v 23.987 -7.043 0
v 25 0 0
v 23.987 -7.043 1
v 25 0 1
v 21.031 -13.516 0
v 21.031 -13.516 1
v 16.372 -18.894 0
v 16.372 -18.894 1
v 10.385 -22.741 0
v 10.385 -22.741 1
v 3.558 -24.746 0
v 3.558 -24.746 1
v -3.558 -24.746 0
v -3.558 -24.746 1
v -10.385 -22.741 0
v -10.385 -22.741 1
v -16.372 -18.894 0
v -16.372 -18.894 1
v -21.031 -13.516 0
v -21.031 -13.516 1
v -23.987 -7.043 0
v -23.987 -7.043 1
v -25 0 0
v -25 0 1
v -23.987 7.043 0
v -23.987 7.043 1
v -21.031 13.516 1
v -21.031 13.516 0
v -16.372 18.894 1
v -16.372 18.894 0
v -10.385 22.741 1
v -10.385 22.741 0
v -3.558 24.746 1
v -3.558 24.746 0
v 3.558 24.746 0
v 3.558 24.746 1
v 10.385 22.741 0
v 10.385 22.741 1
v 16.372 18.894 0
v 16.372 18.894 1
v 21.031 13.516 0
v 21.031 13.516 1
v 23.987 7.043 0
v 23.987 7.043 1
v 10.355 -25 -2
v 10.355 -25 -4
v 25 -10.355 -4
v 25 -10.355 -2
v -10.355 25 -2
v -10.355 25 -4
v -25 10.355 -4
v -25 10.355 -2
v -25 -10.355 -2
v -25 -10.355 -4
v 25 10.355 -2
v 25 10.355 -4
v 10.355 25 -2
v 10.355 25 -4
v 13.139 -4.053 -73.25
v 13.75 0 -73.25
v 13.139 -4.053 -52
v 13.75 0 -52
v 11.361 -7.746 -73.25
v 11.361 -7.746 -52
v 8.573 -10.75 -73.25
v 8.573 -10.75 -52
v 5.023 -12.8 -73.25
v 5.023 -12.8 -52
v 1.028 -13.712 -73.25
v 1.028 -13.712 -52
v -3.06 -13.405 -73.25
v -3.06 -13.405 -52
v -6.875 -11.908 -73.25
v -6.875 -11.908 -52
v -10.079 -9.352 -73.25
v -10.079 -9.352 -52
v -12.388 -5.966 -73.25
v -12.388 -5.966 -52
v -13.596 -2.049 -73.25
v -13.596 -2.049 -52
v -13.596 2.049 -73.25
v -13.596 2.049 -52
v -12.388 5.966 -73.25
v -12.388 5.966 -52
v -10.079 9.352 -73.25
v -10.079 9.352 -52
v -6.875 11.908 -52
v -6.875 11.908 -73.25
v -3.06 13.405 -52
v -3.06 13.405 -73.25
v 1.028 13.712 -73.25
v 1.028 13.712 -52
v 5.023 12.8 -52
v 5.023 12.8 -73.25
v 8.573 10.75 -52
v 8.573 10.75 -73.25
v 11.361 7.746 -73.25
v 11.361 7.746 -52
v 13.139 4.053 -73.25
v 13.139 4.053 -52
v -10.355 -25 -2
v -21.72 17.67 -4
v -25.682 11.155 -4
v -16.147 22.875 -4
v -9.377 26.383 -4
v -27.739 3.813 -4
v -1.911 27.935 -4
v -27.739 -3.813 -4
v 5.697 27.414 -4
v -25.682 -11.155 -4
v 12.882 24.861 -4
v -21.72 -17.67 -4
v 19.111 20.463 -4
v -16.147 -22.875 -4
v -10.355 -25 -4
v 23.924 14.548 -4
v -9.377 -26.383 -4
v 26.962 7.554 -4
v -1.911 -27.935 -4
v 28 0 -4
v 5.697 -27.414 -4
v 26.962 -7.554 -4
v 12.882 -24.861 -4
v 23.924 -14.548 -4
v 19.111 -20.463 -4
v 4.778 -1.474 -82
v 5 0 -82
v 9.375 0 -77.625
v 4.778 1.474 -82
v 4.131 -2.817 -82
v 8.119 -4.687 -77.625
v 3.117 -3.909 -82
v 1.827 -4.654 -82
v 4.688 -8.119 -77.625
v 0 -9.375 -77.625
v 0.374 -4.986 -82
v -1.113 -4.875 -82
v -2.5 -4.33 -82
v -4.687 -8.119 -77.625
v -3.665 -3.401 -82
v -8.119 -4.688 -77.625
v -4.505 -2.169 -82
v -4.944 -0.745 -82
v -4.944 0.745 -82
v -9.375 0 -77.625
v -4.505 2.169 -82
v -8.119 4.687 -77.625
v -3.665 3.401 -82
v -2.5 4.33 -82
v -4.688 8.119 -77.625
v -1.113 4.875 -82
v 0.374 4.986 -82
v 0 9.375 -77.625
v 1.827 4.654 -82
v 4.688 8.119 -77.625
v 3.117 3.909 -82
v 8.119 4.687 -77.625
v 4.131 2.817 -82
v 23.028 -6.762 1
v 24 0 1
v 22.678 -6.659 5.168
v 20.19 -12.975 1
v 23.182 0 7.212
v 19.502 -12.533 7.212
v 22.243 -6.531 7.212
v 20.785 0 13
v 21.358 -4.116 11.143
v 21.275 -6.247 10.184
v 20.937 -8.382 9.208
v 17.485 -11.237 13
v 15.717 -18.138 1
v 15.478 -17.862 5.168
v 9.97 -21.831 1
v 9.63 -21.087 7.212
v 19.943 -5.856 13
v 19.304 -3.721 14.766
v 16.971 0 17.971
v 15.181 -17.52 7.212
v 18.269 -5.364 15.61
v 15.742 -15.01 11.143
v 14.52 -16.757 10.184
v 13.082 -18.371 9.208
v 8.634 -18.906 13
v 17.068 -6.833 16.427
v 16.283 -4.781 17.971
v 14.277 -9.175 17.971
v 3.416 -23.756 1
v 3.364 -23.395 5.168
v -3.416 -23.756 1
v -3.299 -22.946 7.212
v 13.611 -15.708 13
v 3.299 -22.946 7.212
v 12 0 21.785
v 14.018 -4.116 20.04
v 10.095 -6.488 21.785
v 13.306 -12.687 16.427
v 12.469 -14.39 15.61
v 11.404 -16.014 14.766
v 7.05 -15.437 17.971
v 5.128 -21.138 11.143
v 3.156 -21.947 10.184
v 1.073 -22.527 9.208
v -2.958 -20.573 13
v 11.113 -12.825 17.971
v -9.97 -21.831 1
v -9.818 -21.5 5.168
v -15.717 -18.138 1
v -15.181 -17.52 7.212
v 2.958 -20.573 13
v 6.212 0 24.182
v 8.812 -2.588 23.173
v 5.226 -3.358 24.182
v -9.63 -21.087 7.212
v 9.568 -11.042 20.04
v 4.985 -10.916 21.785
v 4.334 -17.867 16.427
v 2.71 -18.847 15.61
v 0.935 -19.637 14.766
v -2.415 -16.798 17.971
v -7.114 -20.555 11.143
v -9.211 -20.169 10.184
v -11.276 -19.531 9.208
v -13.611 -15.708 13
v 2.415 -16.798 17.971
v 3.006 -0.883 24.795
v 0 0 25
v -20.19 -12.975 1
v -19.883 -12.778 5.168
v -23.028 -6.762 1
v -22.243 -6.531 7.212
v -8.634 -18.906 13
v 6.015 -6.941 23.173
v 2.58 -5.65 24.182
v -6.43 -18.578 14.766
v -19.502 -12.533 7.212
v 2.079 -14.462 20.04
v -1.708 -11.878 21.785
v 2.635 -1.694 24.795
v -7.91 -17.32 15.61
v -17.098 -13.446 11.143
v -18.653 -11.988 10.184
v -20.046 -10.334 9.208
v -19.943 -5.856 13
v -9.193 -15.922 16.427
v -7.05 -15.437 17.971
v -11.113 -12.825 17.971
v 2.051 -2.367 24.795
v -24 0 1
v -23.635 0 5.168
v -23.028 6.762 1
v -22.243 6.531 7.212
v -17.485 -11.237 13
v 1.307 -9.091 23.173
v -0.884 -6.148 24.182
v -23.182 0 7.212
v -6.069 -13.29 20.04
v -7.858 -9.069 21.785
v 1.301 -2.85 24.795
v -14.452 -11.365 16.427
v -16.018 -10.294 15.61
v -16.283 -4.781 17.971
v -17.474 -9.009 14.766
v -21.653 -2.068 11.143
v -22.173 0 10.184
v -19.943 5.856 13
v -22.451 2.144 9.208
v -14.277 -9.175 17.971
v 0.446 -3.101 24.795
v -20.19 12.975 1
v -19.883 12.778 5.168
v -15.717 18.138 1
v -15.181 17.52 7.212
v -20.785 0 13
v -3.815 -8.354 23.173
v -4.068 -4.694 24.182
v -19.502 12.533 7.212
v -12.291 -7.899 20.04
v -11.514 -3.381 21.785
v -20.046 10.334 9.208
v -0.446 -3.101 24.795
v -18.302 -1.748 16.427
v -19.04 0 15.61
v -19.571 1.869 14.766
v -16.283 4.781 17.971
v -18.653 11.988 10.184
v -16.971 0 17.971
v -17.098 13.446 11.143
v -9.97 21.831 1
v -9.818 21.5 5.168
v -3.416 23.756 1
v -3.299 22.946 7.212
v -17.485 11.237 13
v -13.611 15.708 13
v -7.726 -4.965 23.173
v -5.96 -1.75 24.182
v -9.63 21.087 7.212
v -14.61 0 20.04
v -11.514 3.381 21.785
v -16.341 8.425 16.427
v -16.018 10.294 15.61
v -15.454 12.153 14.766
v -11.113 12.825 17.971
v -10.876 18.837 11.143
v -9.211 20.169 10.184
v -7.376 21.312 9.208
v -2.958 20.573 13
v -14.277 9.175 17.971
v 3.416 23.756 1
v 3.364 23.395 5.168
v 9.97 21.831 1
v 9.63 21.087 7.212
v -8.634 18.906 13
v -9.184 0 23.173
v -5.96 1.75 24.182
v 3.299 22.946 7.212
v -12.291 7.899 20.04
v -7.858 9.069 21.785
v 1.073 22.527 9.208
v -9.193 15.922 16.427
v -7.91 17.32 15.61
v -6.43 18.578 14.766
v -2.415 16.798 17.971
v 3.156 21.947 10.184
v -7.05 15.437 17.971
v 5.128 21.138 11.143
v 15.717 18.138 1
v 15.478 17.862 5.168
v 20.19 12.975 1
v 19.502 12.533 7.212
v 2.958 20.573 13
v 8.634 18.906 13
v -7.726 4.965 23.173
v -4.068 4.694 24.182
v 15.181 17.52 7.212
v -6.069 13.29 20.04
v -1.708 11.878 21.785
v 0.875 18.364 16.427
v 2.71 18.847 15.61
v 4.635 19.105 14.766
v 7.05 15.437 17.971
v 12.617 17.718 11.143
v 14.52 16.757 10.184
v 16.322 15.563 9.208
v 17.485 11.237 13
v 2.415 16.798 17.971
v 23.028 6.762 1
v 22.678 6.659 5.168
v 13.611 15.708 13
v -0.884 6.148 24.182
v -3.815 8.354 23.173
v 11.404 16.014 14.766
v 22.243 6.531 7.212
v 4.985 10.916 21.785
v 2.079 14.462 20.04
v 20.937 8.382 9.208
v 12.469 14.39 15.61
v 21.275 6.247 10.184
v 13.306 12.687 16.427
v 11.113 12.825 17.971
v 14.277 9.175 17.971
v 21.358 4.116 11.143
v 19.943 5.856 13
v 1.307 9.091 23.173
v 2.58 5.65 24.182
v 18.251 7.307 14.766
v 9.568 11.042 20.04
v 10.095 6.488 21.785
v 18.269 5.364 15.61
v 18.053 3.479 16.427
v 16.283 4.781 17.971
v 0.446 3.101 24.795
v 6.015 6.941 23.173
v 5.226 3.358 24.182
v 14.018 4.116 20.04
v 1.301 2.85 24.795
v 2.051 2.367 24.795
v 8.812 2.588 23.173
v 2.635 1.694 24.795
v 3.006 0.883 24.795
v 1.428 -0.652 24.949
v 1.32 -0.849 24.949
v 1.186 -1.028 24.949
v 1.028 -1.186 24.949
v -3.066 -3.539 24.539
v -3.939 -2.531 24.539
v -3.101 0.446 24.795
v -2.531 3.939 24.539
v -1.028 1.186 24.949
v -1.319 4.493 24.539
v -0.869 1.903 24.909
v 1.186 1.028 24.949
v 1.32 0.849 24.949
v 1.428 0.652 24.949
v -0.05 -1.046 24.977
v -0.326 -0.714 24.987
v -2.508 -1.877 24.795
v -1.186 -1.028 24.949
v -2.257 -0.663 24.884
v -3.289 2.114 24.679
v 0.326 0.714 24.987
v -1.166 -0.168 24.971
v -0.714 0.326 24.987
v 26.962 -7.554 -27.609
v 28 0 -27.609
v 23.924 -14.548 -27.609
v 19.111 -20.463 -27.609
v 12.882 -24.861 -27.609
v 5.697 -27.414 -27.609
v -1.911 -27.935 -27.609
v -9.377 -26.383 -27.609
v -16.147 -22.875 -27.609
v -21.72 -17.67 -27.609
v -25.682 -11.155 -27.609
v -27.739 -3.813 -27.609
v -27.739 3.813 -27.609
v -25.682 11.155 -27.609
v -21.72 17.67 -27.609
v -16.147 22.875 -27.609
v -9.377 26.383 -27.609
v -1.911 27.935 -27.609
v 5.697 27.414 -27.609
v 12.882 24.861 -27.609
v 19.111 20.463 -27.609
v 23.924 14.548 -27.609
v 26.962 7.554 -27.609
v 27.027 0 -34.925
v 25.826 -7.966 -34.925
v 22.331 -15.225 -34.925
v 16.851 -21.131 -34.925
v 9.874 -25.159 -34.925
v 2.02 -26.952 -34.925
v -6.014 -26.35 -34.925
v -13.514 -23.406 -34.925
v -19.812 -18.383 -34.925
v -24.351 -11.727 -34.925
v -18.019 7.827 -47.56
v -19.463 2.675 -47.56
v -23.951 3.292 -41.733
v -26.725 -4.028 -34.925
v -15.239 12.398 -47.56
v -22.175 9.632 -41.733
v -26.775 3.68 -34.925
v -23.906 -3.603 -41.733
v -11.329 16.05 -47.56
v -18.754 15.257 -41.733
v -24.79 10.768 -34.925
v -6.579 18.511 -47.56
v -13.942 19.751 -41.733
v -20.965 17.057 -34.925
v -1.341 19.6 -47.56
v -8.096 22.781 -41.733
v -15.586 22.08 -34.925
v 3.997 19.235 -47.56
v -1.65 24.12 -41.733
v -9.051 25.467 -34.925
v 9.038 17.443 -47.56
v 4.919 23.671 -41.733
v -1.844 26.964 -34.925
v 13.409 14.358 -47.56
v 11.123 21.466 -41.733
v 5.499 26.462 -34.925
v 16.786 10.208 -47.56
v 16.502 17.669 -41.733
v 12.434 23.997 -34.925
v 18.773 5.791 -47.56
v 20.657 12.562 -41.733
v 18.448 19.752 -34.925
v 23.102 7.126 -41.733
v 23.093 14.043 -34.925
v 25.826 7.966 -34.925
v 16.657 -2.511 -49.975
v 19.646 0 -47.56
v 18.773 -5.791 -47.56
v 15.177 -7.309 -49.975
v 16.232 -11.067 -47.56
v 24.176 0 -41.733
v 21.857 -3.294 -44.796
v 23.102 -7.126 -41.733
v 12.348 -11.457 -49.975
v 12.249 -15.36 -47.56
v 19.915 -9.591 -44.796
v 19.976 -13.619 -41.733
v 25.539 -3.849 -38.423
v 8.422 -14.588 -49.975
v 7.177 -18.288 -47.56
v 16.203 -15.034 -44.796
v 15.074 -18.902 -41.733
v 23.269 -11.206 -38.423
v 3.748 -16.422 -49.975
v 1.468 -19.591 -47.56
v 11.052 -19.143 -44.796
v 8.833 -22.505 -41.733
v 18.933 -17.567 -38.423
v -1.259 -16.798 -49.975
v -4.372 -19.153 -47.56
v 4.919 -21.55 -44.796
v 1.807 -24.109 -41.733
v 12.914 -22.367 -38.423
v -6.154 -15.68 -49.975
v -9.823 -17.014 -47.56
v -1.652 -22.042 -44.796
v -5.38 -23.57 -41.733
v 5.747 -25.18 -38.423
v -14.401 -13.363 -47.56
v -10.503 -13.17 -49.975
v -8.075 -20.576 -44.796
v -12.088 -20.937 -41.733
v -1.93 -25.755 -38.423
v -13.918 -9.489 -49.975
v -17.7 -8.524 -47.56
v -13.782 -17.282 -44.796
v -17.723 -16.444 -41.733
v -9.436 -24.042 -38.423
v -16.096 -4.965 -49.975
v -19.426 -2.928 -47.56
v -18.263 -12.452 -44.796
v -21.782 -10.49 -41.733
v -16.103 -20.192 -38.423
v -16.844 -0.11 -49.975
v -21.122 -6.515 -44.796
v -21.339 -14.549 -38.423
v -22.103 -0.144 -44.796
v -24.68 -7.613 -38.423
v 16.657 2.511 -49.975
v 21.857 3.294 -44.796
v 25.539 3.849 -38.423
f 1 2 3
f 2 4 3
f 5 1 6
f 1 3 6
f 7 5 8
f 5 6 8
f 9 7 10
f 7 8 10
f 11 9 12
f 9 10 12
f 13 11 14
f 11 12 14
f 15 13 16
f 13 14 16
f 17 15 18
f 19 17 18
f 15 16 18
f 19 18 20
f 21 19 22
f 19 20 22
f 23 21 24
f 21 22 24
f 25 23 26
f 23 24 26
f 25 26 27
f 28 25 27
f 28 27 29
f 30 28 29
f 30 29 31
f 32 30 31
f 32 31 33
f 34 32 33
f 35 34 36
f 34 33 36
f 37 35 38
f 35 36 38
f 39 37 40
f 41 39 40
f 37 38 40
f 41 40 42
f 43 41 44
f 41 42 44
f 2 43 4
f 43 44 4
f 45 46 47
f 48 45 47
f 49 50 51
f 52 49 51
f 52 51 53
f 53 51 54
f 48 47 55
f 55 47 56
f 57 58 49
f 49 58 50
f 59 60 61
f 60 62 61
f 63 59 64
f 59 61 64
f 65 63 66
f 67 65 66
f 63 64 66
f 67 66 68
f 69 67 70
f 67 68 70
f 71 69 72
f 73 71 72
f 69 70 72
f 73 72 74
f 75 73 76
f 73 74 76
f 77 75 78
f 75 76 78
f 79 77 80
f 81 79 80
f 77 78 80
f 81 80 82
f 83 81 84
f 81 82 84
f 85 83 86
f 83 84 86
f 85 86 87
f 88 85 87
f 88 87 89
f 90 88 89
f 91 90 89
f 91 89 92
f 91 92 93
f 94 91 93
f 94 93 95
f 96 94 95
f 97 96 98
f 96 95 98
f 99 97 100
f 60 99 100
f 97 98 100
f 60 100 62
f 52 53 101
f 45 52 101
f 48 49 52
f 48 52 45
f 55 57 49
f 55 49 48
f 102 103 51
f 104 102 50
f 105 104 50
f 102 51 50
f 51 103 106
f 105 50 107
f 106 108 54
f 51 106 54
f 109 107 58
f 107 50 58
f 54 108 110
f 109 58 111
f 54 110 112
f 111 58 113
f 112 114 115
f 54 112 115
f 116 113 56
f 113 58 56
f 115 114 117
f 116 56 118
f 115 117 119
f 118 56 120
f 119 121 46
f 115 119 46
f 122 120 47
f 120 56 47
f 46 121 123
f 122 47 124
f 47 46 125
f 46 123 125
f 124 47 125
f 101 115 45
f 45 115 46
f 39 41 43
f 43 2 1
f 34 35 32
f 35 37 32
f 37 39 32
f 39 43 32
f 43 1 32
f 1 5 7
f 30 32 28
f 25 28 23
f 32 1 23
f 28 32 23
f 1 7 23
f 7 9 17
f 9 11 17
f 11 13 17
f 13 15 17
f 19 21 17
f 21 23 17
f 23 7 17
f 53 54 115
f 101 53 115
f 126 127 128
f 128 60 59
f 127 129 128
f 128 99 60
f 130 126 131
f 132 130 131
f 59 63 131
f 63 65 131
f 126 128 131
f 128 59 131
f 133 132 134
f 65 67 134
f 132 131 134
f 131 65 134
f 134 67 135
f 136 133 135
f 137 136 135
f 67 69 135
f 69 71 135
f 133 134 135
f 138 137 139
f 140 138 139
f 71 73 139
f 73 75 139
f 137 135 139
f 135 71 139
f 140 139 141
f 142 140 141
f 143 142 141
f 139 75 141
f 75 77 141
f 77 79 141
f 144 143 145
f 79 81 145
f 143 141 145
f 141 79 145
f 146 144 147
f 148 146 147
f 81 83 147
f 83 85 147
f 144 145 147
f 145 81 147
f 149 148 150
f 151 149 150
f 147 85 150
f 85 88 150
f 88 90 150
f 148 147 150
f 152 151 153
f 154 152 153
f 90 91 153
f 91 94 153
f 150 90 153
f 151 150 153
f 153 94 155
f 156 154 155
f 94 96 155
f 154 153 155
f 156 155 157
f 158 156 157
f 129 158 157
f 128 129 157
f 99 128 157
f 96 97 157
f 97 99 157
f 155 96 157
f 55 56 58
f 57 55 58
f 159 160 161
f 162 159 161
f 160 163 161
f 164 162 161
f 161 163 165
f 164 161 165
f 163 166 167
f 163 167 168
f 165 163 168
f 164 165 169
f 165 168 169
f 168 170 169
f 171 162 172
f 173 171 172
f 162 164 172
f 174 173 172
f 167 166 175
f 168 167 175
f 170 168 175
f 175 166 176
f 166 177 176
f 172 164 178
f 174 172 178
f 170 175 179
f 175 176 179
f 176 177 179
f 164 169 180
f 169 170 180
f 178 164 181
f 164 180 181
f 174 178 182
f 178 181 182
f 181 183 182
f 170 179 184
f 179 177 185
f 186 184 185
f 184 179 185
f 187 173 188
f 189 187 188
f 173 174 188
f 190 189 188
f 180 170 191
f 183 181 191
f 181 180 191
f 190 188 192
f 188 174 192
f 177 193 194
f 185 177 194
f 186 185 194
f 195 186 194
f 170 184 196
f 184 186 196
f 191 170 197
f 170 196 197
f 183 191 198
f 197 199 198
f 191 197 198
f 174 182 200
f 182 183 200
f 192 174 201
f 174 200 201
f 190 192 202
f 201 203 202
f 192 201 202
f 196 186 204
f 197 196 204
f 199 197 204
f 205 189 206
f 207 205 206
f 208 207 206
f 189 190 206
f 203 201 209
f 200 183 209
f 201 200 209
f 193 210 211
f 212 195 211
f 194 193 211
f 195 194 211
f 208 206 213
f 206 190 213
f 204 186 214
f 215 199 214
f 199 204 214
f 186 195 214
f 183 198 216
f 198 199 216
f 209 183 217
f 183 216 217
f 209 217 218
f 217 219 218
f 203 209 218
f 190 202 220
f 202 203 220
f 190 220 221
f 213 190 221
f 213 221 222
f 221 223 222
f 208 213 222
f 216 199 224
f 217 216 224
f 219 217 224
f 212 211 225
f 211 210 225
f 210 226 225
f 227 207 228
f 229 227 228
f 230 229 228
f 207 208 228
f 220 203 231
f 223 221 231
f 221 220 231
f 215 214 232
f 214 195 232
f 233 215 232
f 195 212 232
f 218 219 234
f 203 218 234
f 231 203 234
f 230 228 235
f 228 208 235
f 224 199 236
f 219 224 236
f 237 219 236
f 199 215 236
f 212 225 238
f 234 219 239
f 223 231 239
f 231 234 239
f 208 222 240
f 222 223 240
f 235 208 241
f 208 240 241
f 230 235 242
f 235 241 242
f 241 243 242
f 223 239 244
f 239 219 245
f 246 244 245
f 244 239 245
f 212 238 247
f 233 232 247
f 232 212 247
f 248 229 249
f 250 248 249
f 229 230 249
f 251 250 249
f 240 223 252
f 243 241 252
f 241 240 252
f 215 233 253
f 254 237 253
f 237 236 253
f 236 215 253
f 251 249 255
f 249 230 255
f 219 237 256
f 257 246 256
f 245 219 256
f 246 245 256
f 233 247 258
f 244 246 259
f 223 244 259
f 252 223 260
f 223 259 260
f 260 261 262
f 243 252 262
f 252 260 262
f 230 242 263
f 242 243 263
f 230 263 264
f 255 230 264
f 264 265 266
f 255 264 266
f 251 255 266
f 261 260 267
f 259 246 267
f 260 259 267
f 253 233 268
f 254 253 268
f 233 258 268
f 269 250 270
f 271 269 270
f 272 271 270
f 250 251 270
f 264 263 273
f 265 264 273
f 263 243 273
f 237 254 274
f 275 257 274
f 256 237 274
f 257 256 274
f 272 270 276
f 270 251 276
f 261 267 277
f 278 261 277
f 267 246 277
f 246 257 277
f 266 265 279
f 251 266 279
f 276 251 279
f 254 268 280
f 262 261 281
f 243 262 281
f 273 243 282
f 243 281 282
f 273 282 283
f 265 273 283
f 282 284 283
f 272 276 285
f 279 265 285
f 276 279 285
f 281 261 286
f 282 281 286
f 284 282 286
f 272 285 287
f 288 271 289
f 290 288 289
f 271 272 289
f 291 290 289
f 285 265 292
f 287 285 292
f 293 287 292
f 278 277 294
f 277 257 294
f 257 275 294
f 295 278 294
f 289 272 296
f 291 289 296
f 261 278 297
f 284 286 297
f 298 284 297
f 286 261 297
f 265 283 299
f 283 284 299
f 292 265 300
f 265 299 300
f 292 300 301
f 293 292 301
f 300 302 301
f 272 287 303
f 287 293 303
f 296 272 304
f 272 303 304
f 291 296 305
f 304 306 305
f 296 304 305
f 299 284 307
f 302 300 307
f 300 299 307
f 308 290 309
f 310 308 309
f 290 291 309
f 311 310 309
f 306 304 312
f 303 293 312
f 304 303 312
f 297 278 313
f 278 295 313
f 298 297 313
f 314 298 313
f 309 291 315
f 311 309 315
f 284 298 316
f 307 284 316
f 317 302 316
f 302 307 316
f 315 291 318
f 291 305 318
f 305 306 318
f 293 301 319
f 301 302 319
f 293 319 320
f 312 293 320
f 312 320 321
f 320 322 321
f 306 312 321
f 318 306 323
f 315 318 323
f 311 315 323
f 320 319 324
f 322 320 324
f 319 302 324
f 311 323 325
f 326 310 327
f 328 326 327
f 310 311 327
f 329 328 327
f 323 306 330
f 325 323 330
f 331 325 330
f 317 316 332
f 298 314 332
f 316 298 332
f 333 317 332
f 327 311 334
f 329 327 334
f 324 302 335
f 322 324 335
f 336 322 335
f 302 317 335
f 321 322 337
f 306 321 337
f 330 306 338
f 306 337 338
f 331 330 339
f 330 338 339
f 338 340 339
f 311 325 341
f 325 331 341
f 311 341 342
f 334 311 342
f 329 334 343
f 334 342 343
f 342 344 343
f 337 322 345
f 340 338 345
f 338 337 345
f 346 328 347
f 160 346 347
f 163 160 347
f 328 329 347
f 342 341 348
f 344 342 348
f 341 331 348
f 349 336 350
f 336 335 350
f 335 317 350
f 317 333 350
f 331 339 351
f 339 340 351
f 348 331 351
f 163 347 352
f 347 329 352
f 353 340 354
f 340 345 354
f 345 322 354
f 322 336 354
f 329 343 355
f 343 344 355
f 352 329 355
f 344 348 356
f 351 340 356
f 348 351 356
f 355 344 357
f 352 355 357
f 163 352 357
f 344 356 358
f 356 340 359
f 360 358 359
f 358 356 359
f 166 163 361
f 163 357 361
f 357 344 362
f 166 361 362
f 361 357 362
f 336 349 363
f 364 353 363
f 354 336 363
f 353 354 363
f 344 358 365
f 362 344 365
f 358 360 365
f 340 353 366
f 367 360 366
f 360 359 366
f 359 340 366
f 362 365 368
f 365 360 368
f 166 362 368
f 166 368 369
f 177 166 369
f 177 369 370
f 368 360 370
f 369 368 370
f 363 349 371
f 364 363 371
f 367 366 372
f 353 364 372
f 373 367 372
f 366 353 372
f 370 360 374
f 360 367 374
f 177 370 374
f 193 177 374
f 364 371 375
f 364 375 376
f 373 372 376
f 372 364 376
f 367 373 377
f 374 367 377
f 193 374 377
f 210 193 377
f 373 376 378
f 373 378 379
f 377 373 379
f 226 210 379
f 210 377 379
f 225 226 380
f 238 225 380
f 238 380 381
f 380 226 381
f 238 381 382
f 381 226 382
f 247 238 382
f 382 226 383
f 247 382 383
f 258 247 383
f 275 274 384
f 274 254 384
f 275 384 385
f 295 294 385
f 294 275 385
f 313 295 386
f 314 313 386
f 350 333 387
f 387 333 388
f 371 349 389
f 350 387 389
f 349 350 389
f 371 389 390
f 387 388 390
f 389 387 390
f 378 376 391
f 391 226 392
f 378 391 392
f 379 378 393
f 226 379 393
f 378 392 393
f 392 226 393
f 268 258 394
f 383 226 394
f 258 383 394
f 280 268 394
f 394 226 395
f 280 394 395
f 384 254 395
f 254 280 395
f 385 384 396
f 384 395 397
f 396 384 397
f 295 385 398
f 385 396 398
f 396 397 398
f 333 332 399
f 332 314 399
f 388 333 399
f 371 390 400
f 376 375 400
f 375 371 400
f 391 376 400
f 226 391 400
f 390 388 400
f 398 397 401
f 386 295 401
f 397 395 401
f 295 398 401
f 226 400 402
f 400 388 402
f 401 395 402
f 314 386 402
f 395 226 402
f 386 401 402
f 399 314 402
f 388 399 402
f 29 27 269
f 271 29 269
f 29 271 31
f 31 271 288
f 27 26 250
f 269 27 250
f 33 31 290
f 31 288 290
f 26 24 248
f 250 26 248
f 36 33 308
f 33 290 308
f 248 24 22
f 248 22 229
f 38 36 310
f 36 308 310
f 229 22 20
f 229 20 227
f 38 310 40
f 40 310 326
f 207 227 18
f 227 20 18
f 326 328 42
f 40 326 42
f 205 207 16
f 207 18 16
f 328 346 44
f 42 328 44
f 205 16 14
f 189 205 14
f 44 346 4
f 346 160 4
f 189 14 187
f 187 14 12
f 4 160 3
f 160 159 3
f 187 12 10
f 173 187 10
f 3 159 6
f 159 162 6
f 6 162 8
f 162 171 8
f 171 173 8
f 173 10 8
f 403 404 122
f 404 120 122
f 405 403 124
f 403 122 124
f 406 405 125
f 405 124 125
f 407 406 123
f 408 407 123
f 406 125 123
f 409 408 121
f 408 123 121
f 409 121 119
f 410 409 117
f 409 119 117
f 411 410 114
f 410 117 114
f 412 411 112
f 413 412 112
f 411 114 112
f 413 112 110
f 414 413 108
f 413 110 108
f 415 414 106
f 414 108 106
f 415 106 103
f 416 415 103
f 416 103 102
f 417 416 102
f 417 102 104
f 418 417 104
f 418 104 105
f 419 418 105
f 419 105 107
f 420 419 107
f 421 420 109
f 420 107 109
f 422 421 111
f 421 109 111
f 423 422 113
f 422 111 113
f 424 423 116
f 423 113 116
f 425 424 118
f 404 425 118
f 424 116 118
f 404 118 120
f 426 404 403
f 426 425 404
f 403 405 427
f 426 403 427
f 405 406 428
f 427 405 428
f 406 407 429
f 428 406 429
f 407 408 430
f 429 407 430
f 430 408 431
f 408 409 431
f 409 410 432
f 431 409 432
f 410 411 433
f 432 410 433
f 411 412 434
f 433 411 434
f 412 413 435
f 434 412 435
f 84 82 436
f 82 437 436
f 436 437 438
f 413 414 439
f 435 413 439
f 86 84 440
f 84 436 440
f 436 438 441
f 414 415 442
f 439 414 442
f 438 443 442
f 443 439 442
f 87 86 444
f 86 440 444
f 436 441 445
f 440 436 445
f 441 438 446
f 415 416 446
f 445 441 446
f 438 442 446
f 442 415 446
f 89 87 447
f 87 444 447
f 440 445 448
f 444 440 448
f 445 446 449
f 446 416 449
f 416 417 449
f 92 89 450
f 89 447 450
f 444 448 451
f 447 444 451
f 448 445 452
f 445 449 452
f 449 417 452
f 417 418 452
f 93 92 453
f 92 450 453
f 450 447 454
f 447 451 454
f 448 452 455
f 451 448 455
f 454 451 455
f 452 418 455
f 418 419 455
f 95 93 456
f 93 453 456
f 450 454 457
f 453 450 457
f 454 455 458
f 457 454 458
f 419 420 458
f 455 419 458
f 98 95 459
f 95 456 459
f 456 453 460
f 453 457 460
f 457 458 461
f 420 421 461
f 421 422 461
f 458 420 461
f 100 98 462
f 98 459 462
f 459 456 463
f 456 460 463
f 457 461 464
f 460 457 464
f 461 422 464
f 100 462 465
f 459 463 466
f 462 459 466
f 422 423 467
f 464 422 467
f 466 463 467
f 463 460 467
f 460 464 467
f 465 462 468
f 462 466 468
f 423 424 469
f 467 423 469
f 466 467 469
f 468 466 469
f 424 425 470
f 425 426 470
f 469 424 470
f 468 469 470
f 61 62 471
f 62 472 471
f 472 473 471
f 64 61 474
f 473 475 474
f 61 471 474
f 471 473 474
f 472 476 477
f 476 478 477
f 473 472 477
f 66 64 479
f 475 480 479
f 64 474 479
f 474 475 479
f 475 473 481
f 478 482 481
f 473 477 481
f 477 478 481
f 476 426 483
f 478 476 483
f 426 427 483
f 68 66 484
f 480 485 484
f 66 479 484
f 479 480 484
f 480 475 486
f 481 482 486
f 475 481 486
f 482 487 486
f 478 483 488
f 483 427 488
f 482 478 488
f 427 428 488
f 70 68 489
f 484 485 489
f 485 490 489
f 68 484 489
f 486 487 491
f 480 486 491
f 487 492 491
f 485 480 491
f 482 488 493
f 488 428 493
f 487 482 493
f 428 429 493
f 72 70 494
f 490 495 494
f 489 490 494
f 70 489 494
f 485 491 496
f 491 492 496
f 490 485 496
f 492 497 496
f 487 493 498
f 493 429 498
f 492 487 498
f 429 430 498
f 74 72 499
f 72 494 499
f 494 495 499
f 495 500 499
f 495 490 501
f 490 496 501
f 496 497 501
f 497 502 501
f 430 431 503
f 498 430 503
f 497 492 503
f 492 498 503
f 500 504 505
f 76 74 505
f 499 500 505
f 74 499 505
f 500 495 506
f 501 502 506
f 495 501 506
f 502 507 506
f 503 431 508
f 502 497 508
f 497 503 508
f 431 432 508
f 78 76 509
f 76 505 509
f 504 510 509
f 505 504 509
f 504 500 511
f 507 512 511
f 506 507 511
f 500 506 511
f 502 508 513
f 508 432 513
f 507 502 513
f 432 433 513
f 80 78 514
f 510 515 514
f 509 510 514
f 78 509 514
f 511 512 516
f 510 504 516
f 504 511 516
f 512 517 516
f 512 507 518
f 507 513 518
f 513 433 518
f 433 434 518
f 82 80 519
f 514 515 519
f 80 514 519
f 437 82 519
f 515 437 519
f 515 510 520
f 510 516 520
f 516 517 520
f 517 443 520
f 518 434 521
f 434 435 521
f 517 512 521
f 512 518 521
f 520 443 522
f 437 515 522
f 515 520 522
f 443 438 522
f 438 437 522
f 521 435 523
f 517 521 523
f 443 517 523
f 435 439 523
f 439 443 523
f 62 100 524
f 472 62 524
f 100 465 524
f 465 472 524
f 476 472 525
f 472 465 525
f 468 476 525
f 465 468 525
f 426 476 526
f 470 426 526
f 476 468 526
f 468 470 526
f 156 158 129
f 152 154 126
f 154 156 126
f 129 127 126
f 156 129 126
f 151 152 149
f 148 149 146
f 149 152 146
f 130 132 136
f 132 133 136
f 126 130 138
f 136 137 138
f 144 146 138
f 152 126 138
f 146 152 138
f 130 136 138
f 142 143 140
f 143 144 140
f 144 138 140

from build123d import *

# Parameters (mm, degrees)
F3_DEPTH = 2


with BuildPart() as f1:
    # F0 (on Front) → F1 (revolve)
    with BuildSketch(Plane.XZ):
        with BuildLine():
            Line((0, 1), (0, 0))
            Line((0, 0), (25, 0))
            Line((25, 0), (25, 1))
            Line((25, 1), (24, 1))
            ThreePointArc((24, 1), (16.970563, 17.970563), (0, 25))
            Line((0, 25), (0, 1))
        make_face()
        with BuildLine():
            Line((28, -4), (0, -4))
            Line((0, -4), (0, -82))
            Line((0, -82), (5, -82))
            Line((5, -82), (13.75, -73.25))
            Line((13.75, -73.25), (13.75, -56.32651))
            Line((13.75, -56.32651), (13.75, -52))
            ThreePointArc((13.75, -52), (24.176435, -41.733106), (28, -27.608659))
            Line((28, -27.608659), (28, -4))
        make_face()
    revolve(axis=Axis((0, 0, 13), (0, 0, -1)))

    # F2 (on face) → F3 (join)
    with BuildSketch(Plane.XY.offset(-4)):
        Polygon((10.355339, 25), (-10.355339, 25), (-25, 10.355339), (-25, -10.355339), (-10.355339, -25), (10.355339, -25), (25, -10.355339), (25, 10.355339), align=None)
    extrude(amount=F3_DEPTH)


solid = f1.part
